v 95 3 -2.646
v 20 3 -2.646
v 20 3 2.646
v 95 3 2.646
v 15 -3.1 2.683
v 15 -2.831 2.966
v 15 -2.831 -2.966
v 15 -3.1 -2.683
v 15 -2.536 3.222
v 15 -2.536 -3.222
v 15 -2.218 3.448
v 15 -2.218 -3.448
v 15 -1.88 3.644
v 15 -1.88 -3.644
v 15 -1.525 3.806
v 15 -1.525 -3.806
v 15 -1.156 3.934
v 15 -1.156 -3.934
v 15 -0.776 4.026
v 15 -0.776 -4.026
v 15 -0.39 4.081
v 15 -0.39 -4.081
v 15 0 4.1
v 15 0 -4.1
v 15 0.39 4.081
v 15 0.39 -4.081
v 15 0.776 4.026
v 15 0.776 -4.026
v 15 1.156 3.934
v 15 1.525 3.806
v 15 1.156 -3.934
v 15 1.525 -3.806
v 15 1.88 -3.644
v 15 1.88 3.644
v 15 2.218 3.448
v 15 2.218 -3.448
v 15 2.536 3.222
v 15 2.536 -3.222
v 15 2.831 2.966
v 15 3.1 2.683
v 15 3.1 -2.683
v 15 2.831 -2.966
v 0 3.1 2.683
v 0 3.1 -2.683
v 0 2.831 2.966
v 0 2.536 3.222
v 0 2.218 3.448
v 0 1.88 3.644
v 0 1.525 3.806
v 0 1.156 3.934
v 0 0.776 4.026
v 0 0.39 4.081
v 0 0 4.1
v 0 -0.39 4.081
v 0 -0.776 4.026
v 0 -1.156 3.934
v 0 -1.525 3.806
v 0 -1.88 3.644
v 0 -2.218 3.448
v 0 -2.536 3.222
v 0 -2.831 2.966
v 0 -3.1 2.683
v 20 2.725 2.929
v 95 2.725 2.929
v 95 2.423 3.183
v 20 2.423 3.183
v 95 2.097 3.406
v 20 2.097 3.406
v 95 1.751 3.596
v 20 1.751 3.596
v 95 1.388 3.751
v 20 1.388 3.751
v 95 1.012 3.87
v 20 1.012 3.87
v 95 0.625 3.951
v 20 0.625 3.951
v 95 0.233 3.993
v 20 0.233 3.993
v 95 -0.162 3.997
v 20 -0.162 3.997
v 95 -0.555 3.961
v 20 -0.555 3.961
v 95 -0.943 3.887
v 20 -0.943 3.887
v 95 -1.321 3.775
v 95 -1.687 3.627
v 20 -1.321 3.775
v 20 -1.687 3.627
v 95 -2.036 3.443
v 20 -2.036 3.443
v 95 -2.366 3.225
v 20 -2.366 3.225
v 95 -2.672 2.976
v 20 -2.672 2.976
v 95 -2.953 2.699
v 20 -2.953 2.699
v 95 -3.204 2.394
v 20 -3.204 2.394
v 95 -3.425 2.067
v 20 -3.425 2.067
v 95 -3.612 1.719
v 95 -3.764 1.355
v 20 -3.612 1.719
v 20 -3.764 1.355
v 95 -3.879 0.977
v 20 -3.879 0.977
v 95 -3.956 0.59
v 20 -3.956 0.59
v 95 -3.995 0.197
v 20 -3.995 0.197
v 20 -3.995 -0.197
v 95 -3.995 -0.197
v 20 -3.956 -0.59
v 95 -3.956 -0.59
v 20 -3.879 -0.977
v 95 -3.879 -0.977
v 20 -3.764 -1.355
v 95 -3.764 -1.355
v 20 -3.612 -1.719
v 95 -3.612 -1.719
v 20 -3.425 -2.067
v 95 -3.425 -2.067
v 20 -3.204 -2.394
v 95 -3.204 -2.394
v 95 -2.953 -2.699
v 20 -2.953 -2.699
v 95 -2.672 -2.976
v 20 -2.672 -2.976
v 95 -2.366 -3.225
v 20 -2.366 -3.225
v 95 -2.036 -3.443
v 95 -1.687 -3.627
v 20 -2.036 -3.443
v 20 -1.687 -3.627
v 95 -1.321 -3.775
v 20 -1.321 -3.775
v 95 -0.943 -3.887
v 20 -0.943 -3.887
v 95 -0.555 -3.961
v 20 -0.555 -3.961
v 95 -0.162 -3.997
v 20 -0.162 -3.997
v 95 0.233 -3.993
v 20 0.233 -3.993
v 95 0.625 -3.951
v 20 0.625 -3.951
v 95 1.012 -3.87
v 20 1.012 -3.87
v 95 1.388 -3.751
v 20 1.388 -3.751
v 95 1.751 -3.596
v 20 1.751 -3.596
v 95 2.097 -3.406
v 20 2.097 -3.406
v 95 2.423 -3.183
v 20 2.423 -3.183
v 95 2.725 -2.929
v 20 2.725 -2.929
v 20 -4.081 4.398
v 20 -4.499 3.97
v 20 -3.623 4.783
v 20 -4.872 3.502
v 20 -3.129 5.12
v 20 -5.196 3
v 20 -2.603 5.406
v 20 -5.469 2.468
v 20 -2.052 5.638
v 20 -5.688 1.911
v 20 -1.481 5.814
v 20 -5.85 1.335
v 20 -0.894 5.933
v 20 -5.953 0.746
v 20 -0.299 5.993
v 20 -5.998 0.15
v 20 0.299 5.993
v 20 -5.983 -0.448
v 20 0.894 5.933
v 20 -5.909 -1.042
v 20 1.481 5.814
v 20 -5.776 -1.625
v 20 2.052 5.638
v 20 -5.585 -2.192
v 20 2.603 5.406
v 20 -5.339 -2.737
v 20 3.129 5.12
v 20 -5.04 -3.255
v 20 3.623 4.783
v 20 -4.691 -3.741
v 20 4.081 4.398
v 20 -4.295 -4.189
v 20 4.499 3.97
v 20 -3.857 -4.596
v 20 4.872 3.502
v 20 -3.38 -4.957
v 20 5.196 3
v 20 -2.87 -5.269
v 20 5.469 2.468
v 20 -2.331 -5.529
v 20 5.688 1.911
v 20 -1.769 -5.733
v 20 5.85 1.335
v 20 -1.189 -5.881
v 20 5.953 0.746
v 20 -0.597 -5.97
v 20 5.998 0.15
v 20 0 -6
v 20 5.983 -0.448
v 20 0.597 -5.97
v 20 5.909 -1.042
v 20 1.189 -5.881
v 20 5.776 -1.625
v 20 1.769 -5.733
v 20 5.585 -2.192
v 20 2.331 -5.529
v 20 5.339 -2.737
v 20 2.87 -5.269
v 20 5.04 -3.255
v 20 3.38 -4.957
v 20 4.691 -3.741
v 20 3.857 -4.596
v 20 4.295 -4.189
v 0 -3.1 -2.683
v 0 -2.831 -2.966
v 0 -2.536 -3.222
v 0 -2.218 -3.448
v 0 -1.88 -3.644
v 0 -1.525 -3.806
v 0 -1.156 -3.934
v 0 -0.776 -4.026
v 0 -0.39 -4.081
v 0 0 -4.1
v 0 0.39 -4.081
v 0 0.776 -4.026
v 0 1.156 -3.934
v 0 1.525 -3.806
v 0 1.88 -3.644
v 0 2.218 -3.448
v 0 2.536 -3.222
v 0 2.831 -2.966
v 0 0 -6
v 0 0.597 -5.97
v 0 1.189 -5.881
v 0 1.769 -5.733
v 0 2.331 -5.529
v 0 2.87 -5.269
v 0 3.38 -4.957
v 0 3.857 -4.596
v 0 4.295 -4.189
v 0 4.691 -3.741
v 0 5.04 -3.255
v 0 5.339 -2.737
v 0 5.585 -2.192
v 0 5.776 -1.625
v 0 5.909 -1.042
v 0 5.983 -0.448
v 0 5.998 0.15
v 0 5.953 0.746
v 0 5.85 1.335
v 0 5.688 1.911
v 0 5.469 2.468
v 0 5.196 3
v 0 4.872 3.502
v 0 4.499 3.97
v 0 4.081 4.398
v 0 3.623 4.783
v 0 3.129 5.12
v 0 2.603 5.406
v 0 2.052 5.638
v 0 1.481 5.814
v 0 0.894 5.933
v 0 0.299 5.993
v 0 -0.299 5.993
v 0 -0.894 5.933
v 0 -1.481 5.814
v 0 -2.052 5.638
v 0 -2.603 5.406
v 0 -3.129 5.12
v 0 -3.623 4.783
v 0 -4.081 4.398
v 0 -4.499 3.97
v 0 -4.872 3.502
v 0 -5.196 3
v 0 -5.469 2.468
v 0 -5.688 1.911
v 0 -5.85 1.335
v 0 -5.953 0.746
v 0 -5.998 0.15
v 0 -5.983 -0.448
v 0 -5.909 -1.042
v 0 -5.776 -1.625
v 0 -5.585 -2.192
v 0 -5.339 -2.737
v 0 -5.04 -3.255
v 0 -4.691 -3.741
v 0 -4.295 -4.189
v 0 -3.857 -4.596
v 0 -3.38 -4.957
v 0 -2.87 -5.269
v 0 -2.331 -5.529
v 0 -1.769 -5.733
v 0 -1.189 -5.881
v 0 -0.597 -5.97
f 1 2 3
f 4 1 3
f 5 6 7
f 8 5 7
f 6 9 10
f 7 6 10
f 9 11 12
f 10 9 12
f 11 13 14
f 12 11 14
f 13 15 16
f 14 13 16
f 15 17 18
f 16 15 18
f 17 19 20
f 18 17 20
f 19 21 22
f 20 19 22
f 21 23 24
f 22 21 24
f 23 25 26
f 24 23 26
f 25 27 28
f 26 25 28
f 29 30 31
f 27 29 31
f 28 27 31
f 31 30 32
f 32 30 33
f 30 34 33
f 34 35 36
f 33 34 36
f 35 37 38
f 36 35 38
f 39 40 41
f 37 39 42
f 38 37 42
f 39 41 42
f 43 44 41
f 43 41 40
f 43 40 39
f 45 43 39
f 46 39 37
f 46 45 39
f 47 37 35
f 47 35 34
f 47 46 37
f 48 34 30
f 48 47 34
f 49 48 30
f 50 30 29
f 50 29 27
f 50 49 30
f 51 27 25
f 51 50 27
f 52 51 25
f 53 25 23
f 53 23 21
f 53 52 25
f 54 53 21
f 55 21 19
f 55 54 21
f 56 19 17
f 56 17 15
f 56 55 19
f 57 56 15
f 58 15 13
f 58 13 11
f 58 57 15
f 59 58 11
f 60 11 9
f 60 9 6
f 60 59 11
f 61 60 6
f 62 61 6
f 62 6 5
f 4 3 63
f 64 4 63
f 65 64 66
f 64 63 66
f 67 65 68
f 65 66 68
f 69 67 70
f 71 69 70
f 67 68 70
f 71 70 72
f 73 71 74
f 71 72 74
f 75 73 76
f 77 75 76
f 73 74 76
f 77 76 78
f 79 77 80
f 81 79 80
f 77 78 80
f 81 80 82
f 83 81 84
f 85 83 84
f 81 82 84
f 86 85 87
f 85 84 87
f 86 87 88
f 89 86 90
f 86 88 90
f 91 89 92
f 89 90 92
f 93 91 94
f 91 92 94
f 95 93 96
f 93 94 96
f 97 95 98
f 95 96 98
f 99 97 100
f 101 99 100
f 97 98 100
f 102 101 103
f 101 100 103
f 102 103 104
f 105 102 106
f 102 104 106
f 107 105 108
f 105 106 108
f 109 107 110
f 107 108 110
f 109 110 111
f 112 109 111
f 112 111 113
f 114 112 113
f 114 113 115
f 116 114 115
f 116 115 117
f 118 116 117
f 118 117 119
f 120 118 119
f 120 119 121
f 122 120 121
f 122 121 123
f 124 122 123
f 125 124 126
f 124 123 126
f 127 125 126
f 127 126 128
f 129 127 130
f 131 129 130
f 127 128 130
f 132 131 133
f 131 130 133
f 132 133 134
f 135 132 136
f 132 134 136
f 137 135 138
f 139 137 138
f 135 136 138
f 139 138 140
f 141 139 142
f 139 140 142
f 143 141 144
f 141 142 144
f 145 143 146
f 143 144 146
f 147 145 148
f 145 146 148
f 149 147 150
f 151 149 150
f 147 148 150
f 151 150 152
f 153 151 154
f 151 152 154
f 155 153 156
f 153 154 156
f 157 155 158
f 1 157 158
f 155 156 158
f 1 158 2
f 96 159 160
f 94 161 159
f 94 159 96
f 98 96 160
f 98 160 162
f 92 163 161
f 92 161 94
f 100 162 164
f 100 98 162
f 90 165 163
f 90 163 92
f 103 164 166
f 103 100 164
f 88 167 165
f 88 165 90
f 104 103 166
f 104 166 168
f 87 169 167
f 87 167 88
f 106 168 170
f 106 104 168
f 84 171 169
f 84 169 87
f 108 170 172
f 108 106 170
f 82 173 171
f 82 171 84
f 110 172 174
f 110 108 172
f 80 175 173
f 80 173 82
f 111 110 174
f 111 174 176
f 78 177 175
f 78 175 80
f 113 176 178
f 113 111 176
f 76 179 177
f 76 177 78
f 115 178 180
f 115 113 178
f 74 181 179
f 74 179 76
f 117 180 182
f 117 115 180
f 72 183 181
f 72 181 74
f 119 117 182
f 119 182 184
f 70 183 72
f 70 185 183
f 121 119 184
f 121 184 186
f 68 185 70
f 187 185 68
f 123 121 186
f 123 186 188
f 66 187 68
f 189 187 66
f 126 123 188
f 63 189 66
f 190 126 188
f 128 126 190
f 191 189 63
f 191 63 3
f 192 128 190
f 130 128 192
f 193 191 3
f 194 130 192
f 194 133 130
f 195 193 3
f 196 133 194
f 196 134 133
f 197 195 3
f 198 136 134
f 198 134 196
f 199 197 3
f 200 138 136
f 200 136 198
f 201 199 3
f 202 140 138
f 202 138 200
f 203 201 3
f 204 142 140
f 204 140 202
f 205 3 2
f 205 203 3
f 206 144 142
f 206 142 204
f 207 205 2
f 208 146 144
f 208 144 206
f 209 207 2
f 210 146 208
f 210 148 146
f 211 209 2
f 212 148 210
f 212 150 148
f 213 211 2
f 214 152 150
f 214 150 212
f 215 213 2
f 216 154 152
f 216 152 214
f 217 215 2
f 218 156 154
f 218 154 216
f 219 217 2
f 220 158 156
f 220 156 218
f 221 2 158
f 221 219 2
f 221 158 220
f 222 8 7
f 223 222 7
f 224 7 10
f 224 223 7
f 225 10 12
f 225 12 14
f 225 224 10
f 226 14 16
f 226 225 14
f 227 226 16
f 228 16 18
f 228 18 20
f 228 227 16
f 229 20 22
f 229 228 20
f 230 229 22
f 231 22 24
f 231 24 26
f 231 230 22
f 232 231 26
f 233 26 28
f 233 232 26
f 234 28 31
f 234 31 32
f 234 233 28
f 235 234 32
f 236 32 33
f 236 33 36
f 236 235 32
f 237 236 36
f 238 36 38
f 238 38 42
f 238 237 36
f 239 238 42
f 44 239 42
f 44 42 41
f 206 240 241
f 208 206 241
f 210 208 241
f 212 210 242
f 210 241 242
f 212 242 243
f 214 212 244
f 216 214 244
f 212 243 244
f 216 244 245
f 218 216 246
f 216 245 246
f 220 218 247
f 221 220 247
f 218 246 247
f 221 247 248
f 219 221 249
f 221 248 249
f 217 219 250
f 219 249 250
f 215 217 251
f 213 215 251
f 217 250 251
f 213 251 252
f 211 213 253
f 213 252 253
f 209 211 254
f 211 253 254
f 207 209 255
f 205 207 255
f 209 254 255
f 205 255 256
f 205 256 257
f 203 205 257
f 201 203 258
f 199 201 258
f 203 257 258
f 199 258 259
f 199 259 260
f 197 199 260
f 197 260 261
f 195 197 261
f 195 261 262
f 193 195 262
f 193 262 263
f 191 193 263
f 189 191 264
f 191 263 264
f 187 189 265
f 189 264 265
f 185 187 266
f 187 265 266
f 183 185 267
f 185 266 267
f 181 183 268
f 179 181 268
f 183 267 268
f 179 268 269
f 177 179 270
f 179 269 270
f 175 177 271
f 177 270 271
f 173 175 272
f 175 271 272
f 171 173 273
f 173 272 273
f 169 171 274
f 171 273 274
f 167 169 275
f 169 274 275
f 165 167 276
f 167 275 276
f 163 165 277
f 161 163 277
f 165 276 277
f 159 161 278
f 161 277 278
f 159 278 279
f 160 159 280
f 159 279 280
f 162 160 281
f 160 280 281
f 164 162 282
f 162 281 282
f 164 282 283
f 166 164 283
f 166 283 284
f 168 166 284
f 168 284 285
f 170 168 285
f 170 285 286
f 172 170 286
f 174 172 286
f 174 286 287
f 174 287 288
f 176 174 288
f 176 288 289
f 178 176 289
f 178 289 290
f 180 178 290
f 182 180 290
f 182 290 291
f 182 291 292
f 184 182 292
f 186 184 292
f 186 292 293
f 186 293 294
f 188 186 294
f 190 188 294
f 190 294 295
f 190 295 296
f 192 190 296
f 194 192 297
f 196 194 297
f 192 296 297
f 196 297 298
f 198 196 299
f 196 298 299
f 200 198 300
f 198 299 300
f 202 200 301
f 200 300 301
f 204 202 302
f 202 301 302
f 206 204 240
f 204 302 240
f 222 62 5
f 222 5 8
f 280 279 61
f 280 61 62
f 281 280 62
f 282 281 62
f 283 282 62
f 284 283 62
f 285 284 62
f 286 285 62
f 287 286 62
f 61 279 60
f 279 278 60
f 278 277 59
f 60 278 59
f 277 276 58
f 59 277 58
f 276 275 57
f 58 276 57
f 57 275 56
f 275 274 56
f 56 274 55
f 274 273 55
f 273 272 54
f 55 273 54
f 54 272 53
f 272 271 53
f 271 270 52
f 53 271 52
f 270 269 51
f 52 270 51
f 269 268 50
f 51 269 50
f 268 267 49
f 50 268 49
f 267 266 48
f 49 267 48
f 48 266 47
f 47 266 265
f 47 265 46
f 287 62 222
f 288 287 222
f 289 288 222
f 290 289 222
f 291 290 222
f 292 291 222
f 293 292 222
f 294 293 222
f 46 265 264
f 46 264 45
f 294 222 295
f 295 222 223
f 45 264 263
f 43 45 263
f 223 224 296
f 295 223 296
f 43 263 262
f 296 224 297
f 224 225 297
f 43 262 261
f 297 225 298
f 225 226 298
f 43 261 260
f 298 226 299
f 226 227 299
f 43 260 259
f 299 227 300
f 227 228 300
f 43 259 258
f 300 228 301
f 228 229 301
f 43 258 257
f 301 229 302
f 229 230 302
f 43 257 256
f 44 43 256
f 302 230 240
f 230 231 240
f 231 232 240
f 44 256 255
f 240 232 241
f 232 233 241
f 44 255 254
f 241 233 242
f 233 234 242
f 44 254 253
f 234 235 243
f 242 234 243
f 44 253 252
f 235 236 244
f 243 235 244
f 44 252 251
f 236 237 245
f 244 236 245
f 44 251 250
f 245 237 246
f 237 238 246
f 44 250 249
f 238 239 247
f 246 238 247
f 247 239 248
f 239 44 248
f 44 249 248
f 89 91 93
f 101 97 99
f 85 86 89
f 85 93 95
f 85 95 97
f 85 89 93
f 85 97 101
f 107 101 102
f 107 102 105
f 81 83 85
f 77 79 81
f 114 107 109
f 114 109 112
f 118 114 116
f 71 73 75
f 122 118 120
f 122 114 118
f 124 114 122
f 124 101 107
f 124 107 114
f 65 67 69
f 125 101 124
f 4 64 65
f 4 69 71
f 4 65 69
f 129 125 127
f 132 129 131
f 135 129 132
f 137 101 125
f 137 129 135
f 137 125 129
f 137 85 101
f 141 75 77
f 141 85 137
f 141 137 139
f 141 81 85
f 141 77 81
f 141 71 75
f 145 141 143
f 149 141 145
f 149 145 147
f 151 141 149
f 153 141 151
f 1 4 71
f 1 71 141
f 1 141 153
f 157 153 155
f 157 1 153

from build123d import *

# Parameters (mm, degrees)
SKETCH1_R           = 6
BOSS_EXTRUDE1_DEPTH = 20
CUT_EXTRUDE1_DEPTH  = 15
BOSS_EXTRUDE2_DEPTH = 75


with BuildPart() as part:
    # Sketch1 → Boss-Extrude1 (new body)
    with BuildSketch(Plane(origin=(0, 0, 0), x_dir=(0, 0, -1), z_dir=(1, 0, 0))):
        Circle(SKETCH1_R)
    extrude(amount=BOSS_EXTRUDE1_DEPTH)

    # Sketch2 → Cut-Extrude1 (cut)
    with BuildSketch(Plane.ZY):
        with BuildLine():
            Line((-2.683281573, 3.1), (2.683281573, 3.1))
            ThreePointArc((2.683281573, 3.1), (4.1, 0), (2.683281573, -3.1))
            Line((2.683281573, -3.1), (-2.683281573, -3.1))
            ThreePointArc((-2.683281573, -3.1), (-4.1, 0), (-2.683281573, 3.1))
        make_face()
    extrude(amount=-CUT_EXTRUDE1_DEPTH, mode=Mode.SUBTRACT)

    # Sketch3 → Boss-Extrude2 (add)
    with BuildSketch(Plane(origin=(20, 0, 0), x_dir=(0, 0, -1), z_dir=(1, 0, 0))):
        with BuildLine():
            Line((2.645751311, 3), (-2.645751311, 3))
            ThreePointArc((-2.645751311, 3), (0, -4), (2.645751311, 3))
        make_face()
    extrude(amount=BOSS_EXTRUDE2_DEPTH)


solid = part.part
